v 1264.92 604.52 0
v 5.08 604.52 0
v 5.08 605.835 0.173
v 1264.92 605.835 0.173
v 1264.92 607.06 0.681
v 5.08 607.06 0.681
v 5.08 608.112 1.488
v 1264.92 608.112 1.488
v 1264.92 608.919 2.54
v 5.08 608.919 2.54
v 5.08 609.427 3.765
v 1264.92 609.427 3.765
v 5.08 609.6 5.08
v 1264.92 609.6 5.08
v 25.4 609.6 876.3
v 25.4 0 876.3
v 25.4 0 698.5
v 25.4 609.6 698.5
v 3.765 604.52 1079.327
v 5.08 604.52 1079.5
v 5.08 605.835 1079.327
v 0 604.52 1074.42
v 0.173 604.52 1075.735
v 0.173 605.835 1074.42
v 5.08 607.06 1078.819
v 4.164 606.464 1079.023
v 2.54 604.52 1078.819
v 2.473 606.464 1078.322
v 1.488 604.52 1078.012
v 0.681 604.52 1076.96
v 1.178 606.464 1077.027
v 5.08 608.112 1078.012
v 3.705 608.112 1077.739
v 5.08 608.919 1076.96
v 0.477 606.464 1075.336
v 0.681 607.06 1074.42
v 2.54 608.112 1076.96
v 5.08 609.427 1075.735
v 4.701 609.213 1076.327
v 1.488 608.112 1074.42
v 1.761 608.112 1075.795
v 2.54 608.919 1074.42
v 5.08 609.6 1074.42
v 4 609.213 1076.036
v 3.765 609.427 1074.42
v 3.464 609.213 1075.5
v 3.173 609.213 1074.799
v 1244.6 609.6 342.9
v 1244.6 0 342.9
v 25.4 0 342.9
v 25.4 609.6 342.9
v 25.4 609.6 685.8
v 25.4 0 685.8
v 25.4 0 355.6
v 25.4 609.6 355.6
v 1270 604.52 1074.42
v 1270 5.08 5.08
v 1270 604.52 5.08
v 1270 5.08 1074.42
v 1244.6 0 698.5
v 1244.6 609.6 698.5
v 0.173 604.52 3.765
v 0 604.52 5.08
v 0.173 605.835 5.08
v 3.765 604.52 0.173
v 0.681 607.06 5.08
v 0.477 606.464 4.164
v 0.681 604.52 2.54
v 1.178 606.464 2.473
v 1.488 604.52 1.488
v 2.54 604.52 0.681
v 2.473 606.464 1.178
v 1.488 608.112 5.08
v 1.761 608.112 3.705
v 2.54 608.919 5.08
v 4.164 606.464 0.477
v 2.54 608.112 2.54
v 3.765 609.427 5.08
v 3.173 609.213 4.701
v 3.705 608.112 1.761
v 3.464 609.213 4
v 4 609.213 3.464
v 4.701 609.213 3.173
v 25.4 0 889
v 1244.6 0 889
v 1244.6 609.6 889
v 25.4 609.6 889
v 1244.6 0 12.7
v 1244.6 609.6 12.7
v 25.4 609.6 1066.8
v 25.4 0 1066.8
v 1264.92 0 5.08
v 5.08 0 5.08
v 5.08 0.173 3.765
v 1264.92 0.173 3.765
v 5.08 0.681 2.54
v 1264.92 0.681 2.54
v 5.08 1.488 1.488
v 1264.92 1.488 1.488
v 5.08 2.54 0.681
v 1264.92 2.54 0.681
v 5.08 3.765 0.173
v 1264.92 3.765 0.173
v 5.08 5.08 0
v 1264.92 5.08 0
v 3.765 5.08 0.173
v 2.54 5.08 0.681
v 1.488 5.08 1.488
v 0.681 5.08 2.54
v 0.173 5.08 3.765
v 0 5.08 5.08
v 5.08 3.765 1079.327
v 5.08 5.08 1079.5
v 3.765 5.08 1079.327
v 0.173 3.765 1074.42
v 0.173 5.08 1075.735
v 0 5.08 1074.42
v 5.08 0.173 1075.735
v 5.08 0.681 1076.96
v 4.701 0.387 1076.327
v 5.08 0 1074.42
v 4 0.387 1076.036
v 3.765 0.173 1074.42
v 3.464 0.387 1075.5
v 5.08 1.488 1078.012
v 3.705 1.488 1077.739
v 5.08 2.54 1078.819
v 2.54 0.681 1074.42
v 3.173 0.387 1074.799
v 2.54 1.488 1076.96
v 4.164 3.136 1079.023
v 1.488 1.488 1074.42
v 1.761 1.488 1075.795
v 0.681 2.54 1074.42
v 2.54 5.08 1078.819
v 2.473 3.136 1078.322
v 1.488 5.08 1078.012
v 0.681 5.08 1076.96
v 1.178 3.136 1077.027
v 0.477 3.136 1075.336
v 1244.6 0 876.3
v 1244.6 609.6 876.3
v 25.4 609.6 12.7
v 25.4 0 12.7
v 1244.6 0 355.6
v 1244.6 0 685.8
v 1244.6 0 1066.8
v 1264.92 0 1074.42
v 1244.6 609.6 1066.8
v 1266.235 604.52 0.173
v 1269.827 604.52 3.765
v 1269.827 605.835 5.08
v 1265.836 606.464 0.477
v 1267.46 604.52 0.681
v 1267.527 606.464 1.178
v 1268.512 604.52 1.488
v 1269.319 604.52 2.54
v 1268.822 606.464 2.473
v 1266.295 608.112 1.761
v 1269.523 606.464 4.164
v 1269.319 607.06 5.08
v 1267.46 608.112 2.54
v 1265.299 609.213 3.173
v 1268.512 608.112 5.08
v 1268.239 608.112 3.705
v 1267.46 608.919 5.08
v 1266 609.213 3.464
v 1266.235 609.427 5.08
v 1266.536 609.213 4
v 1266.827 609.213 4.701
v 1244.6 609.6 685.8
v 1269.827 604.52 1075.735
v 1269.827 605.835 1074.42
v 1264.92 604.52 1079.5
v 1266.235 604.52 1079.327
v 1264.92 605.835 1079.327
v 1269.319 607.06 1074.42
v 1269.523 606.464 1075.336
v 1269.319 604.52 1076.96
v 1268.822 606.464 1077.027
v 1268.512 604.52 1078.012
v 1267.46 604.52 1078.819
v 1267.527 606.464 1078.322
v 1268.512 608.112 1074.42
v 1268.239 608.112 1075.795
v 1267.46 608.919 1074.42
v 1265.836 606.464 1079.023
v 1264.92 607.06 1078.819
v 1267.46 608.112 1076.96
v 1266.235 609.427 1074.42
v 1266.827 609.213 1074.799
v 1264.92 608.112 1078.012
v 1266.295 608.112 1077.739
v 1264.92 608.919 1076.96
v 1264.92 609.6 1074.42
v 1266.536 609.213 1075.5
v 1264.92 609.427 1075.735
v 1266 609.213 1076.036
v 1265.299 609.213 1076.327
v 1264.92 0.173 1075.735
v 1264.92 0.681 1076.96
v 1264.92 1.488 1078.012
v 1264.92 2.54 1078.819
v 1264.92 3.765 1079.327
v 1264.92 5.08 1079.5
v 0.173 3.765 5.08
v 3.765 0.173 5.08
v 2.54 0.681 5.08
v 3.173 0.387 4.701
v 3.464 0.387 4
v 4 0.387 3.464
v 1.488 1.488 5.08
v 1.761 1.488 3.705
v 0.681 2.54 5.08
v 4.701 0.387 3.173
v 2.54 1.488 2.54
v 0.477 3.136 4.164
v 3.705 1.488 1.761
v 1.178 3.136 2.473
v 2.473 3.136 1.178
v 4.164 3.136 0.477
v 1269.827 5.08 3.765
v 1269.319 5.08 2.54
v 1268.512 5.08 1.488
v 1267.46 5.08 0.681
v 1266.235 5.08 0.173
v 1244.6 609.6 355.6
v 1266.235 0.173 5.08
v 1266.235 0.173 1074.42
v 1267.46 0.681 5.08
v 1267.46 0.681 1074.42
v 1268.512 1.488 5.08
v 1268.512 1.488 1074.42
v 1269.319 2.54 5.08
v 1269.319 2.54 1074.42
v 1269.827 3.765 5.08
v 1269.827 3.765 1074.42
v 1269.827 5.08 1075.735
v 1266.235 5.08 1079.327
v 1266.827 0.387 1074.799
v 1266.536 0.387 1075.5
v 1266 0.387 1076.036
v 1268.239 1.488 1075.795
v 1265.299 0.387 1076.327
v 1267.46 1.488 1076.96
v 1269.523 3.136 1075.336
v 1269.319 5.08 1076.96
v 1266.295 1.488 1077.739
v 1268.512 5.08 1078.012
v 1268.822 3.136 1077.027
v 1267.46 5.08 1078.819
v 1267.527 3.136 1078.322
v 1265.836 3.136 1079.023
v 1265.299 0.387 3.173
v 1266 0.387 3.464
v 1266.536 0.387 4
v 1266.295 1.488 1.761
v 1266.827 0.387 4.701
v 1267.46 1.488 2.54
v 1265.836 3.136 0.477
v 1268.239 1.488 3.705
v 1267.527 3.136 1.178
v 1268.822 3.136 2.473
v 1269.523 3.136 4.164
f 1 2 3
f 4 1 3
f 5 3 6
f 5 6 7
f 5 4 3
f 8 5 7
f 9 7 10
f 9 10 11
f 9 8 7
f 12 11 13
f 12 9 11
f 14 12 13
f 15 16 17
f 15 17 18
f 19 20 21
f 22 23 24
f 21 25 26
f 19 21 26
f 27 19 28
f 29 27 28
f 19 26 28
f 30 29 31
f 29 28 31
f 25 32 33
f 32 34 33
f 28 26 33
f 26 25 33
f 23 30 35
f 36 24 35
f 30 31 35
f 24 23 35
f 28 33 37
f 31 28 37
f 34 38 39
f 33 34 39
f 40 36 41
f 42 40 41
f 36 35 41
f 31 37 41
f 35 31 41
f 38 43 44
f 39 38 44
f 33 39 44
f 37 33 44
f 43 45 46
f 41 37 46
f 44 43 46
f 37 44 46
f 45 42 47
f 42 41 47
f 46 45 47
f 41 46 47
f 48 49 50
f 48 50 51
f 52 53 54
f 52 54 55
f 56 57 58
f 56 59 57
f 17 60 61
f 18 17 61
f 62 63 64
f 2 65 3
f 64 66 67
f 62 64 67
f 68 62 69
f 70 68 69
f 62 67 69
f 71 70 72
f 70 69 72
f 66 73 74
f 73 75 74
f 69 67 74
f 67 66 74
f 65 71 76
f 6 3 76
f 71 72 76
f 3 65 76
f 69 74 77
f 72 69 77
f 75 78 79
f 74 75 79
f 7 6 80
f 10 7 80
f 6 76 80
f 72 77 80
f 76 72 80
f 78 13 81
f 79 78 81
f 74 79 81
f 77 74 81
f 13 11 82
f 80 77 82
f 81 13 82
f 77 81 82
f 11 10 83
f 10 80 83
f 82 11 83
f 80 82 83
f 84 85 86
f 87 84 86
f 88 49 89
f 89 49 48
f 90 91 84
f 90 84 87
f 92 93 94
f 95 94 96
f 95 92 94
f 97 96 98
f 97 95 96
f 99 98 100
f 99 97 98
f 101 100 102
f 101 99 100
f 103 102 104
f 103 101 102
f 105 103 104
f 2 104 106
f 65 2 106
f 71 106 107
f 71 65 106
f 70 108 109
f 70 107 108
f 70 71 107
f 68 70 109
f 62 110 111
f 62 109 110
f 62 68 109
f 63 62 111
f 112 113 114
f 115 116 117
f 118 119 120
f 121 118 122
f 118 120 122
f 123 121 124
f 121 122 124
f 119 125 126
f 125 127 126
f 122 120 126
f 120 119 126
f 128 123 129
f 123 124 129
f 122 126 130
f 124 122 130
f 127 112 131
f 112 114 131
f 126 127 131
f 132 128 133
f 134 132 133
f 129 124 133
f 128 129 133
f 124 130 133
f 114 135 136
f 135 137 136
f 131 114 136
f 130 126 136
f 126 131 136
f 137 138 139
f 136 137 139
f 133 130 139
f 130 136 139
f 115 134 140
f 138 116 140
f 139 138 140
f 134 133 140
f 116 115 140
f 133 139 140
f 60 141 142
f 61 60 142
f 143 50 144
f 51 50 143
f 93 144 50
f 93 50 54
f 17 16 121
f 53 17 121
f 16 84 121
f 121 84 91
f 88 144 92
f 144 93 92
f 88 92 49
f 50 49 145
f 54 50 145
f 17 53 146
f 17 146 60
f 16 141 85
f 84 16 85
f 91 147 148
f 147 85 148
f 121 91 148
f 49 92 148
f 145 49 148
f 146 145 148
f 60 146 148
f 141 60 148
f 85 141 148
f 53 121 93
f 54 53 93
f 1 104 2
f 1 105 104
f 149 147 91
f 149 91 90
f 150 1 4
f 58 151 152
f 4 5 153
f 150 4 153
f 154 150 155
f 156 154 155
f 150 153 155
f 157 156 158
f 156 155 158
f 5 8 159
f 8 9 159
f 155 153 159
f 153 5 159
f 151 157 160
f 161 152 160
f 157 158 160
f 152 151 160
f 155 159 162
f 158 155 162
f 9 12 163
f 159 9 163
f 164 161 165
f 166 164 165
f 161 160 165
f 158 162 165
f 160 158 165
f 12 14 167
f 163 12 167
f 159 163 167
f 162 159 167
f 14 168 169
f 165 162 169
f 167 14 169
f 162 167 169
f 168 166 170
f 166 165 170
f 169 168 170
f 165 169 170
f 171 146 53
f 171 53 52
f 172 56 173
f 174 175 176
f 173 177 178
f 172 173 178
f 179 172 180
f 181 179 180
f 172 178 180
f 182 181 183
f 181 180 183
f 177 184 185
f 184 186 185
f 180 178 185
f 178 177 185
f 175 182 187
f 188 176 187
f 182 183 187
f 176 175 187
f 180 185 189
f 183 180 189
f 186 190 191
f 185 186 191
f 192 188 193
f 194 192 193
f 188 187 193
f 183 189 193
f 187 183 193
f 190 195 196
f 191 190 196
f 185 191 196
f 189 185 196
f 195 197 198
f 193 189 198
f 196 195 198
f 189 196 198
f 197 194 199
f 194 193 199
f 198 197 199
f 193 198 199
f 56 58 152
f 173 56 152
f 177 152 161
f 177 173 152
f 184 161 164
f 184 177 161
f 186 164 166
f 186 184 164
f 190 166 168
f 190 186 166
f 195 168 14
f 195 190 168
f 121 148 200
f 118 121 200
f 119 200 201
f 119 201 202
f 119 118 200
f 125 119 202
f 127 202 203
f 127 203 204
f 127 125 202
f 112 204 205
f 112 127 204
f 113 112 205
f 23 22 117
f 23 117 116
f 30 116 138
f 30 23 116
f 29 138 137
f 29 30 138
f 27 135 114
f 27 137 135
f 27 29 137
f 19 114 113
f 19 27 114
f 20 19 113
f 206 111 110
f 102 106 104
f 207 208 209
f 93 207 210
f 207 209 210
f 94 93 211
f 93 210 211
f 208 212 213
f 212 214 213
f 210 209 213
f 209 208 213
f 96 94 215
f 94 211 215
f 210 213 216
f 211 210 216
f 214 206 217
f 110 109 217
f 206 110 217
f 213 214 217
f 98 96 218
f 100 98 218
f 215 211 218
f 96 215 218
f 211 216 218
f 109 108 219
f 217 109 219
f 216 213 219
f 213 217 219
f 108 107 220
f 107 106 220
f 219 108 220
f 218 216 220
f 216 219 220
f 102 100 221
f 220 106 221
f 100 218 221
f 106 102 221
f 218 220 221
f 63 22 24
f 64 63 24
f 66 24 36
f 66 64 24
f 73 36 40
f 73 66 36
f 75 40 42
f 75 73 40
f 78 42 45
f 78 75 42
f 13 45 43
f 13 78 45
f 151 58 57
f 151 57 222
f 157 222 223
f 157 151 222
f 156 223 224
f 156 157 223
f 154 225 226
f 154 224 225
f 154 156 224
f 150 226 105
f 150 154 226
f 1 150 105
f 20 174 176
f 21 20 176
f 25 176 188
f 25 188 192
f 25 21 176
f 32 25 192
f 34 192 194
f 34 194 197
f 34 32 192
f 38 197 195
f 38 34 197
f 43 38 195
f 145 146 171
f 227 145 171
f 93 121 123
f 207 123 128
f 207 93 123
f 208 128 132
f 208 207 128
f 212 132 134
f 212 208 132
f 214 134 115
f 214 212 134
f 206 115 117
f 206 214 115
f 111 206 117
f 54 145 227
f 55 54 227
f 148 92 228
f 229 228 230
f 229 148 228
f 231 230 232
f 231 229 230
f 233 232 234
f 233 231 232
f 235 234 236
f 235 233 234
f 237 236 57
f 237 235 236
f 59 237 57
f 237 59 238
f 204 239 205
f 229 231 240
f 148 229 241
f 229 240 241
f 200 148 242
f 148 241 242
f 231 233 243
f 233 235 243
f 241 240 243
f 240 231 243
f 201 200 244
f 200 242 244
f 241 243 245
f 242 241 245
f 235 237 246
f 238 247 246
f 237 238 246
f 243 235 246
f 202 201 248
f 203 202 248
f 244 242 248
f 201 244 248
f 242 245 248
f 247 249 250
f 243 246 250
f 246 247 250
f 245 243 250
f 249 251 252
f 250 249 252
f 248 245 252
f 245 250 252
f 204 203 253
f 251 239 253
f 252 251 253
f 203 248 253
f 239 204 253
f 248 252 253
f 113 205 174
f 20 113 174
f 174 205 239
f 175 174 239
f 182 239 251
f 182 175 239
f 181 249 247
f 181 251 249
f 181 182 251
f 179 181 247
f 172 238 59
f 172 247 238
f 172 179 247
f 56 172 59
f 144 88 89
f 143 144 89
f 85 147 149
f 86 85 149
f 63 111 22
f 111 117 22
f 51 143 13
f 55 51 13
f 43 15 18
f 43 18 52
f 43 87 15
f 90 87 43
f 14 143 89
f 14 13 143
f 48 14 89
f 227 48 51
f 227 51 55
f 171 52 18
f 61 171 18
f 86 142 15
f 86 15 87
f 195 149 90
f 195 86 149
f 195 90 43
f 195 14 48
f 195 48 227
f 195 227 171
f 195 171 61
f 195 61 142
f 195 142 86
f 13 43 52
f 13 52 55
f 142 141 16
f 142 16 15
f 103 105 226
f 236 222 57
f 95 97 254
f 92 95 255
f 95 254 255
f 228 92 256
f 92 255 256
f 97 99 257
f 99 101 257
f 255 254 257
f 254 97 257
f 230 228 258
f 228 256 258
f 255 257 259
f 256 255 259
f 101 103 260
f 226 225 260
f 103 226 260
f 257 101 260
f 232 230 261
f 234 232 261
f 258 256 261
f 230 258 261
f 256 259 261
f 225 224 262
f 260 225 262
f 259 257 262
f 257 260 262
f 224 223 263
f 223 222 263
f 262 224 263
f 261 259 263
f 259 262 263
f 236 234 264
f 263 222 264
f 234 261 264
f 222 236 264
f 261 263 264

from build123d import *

# Parameters (mm, degrees)
F0_W      = 609.6
F0_H      = 1079.5
F1_DEPTH  = 25.4
F2_W      = 609.6
F2_H      = 12.7
F3_DEPTH  = 609.6
F4_W      = 609.6
F4_H      = 12.7
F5_DEPTH  = 609.6
F6_W      = 609.6
F6_H      = 12.7
F7_DEPTH  = 609.6
F8_W      = 609.6
F8_H      = 12.7
F9_DEPTH  = 609.6
F10_W     = 609.6
F10_H     = 12.7
F11_DEPTH = 609.6
F13_R     = 5.08
F14_R     = 5.08
F15_R     = 5.08
F16_R     = 5.08
F17_R     = 5.08
F18_R     = 5.08


with BuildPart() as f1:
    # F0 (on Right) → F1 (new body)
    with BuildSketch(Plane.YZ):
        with Locations((304.8, 539.75)):
            Rectangle(F0_W, F0_H)
    extrude(amount=F1_DEPTH)

    # F2 (on face) → F3 (join)
    with BuildSketch(Plane.YZ.offset(25.4)):
        with Locations((304.8, 6.35)):
            Rectangle(F2_W, F2_H)
    extrude(amount=F3_DEPTH)

    # F4 (on face) → F5 (join)
    with BuildSketch(Plane.YZ.offset(25.4)):
        with Locations((304.8, 349.25)):
            Rectangle(F4_W, F4_H)
    extrude(amount=F5_DEPTH)

    # F6 (on face) → F7 (join)
    with BuildSketch(Plane.YZ.offset(25.4)):
        with Locations((304.8, 692.15)):
            Rectangle(F6_W, F6_H)
    extrude(amount=F7_DEPTH)

    # F8 (on face) → F9 (join)
    with BuildSketch(Plane.YZ.offset(25.4)):
        with Locations((304.8, 882.65)):
            Rectangle(F8_W, F8_H)
    extrude(amount=F9_DEPTH)

    # F10 (on face) → F11 (join)
    with BuildSketch(Plane.YZ.offset(25.4)):
        with Locations((304.8, 1073.15)):
            Rectangle(F10_W, F10_H)
    extrude(amount=F11_DEPTH)

    # F12: F1 across face


with BuildPart() as f1_1:
    add(f1.part)
    add(f1.part.mirror(Plane(origin=(635, 304.8, 6.35), x_dir=(0, 1, 0), z_dir=(1, 0, 0))))

    # F13
    f13_edges = [f1_1.edges().sort_by_distance(p)[0] for p in [
        (0, 304.8, 1079.5),
    ]]
    fillet(f13_edges, radius=F13_R)

    # F14
    f14_edges = [f1_1.edges().sort_by_distance(p)[0] for p in [
        (1270, 304.8, 1079.5),
    ]]
    fillet(f14_edges, radius=F14_R)

    # F15
    f15_edges = [f1_1.edges().sort_by_distance(p)[0] for p in [
        (1270, 304.8, 0),
    ]]
    fillet(f15_edges, radius=F15_R)

    # F16
    f16_edges = [f1_1.edges().sort_by_distance(p)[0] for p in [
        (0, 304.8, 0),
    ]]
    fillet(f16_edges, radius=F16_R)

    # F17
    f17_edges = [f1_1.edges().sort_by_distance(p)[0] for p in [
        (635, 0, 1079.5),
    ]]
    fillet(f17_edges, radius=F17_R)

    # F18
    f18_edges = [f1_1.edges().sort_by_distance(p)[0] for p in [
        (635, 609.6, 1079.5),
    ]]
    fillet(f18_edges, radius=F18_R)


solid = f1_1.part
